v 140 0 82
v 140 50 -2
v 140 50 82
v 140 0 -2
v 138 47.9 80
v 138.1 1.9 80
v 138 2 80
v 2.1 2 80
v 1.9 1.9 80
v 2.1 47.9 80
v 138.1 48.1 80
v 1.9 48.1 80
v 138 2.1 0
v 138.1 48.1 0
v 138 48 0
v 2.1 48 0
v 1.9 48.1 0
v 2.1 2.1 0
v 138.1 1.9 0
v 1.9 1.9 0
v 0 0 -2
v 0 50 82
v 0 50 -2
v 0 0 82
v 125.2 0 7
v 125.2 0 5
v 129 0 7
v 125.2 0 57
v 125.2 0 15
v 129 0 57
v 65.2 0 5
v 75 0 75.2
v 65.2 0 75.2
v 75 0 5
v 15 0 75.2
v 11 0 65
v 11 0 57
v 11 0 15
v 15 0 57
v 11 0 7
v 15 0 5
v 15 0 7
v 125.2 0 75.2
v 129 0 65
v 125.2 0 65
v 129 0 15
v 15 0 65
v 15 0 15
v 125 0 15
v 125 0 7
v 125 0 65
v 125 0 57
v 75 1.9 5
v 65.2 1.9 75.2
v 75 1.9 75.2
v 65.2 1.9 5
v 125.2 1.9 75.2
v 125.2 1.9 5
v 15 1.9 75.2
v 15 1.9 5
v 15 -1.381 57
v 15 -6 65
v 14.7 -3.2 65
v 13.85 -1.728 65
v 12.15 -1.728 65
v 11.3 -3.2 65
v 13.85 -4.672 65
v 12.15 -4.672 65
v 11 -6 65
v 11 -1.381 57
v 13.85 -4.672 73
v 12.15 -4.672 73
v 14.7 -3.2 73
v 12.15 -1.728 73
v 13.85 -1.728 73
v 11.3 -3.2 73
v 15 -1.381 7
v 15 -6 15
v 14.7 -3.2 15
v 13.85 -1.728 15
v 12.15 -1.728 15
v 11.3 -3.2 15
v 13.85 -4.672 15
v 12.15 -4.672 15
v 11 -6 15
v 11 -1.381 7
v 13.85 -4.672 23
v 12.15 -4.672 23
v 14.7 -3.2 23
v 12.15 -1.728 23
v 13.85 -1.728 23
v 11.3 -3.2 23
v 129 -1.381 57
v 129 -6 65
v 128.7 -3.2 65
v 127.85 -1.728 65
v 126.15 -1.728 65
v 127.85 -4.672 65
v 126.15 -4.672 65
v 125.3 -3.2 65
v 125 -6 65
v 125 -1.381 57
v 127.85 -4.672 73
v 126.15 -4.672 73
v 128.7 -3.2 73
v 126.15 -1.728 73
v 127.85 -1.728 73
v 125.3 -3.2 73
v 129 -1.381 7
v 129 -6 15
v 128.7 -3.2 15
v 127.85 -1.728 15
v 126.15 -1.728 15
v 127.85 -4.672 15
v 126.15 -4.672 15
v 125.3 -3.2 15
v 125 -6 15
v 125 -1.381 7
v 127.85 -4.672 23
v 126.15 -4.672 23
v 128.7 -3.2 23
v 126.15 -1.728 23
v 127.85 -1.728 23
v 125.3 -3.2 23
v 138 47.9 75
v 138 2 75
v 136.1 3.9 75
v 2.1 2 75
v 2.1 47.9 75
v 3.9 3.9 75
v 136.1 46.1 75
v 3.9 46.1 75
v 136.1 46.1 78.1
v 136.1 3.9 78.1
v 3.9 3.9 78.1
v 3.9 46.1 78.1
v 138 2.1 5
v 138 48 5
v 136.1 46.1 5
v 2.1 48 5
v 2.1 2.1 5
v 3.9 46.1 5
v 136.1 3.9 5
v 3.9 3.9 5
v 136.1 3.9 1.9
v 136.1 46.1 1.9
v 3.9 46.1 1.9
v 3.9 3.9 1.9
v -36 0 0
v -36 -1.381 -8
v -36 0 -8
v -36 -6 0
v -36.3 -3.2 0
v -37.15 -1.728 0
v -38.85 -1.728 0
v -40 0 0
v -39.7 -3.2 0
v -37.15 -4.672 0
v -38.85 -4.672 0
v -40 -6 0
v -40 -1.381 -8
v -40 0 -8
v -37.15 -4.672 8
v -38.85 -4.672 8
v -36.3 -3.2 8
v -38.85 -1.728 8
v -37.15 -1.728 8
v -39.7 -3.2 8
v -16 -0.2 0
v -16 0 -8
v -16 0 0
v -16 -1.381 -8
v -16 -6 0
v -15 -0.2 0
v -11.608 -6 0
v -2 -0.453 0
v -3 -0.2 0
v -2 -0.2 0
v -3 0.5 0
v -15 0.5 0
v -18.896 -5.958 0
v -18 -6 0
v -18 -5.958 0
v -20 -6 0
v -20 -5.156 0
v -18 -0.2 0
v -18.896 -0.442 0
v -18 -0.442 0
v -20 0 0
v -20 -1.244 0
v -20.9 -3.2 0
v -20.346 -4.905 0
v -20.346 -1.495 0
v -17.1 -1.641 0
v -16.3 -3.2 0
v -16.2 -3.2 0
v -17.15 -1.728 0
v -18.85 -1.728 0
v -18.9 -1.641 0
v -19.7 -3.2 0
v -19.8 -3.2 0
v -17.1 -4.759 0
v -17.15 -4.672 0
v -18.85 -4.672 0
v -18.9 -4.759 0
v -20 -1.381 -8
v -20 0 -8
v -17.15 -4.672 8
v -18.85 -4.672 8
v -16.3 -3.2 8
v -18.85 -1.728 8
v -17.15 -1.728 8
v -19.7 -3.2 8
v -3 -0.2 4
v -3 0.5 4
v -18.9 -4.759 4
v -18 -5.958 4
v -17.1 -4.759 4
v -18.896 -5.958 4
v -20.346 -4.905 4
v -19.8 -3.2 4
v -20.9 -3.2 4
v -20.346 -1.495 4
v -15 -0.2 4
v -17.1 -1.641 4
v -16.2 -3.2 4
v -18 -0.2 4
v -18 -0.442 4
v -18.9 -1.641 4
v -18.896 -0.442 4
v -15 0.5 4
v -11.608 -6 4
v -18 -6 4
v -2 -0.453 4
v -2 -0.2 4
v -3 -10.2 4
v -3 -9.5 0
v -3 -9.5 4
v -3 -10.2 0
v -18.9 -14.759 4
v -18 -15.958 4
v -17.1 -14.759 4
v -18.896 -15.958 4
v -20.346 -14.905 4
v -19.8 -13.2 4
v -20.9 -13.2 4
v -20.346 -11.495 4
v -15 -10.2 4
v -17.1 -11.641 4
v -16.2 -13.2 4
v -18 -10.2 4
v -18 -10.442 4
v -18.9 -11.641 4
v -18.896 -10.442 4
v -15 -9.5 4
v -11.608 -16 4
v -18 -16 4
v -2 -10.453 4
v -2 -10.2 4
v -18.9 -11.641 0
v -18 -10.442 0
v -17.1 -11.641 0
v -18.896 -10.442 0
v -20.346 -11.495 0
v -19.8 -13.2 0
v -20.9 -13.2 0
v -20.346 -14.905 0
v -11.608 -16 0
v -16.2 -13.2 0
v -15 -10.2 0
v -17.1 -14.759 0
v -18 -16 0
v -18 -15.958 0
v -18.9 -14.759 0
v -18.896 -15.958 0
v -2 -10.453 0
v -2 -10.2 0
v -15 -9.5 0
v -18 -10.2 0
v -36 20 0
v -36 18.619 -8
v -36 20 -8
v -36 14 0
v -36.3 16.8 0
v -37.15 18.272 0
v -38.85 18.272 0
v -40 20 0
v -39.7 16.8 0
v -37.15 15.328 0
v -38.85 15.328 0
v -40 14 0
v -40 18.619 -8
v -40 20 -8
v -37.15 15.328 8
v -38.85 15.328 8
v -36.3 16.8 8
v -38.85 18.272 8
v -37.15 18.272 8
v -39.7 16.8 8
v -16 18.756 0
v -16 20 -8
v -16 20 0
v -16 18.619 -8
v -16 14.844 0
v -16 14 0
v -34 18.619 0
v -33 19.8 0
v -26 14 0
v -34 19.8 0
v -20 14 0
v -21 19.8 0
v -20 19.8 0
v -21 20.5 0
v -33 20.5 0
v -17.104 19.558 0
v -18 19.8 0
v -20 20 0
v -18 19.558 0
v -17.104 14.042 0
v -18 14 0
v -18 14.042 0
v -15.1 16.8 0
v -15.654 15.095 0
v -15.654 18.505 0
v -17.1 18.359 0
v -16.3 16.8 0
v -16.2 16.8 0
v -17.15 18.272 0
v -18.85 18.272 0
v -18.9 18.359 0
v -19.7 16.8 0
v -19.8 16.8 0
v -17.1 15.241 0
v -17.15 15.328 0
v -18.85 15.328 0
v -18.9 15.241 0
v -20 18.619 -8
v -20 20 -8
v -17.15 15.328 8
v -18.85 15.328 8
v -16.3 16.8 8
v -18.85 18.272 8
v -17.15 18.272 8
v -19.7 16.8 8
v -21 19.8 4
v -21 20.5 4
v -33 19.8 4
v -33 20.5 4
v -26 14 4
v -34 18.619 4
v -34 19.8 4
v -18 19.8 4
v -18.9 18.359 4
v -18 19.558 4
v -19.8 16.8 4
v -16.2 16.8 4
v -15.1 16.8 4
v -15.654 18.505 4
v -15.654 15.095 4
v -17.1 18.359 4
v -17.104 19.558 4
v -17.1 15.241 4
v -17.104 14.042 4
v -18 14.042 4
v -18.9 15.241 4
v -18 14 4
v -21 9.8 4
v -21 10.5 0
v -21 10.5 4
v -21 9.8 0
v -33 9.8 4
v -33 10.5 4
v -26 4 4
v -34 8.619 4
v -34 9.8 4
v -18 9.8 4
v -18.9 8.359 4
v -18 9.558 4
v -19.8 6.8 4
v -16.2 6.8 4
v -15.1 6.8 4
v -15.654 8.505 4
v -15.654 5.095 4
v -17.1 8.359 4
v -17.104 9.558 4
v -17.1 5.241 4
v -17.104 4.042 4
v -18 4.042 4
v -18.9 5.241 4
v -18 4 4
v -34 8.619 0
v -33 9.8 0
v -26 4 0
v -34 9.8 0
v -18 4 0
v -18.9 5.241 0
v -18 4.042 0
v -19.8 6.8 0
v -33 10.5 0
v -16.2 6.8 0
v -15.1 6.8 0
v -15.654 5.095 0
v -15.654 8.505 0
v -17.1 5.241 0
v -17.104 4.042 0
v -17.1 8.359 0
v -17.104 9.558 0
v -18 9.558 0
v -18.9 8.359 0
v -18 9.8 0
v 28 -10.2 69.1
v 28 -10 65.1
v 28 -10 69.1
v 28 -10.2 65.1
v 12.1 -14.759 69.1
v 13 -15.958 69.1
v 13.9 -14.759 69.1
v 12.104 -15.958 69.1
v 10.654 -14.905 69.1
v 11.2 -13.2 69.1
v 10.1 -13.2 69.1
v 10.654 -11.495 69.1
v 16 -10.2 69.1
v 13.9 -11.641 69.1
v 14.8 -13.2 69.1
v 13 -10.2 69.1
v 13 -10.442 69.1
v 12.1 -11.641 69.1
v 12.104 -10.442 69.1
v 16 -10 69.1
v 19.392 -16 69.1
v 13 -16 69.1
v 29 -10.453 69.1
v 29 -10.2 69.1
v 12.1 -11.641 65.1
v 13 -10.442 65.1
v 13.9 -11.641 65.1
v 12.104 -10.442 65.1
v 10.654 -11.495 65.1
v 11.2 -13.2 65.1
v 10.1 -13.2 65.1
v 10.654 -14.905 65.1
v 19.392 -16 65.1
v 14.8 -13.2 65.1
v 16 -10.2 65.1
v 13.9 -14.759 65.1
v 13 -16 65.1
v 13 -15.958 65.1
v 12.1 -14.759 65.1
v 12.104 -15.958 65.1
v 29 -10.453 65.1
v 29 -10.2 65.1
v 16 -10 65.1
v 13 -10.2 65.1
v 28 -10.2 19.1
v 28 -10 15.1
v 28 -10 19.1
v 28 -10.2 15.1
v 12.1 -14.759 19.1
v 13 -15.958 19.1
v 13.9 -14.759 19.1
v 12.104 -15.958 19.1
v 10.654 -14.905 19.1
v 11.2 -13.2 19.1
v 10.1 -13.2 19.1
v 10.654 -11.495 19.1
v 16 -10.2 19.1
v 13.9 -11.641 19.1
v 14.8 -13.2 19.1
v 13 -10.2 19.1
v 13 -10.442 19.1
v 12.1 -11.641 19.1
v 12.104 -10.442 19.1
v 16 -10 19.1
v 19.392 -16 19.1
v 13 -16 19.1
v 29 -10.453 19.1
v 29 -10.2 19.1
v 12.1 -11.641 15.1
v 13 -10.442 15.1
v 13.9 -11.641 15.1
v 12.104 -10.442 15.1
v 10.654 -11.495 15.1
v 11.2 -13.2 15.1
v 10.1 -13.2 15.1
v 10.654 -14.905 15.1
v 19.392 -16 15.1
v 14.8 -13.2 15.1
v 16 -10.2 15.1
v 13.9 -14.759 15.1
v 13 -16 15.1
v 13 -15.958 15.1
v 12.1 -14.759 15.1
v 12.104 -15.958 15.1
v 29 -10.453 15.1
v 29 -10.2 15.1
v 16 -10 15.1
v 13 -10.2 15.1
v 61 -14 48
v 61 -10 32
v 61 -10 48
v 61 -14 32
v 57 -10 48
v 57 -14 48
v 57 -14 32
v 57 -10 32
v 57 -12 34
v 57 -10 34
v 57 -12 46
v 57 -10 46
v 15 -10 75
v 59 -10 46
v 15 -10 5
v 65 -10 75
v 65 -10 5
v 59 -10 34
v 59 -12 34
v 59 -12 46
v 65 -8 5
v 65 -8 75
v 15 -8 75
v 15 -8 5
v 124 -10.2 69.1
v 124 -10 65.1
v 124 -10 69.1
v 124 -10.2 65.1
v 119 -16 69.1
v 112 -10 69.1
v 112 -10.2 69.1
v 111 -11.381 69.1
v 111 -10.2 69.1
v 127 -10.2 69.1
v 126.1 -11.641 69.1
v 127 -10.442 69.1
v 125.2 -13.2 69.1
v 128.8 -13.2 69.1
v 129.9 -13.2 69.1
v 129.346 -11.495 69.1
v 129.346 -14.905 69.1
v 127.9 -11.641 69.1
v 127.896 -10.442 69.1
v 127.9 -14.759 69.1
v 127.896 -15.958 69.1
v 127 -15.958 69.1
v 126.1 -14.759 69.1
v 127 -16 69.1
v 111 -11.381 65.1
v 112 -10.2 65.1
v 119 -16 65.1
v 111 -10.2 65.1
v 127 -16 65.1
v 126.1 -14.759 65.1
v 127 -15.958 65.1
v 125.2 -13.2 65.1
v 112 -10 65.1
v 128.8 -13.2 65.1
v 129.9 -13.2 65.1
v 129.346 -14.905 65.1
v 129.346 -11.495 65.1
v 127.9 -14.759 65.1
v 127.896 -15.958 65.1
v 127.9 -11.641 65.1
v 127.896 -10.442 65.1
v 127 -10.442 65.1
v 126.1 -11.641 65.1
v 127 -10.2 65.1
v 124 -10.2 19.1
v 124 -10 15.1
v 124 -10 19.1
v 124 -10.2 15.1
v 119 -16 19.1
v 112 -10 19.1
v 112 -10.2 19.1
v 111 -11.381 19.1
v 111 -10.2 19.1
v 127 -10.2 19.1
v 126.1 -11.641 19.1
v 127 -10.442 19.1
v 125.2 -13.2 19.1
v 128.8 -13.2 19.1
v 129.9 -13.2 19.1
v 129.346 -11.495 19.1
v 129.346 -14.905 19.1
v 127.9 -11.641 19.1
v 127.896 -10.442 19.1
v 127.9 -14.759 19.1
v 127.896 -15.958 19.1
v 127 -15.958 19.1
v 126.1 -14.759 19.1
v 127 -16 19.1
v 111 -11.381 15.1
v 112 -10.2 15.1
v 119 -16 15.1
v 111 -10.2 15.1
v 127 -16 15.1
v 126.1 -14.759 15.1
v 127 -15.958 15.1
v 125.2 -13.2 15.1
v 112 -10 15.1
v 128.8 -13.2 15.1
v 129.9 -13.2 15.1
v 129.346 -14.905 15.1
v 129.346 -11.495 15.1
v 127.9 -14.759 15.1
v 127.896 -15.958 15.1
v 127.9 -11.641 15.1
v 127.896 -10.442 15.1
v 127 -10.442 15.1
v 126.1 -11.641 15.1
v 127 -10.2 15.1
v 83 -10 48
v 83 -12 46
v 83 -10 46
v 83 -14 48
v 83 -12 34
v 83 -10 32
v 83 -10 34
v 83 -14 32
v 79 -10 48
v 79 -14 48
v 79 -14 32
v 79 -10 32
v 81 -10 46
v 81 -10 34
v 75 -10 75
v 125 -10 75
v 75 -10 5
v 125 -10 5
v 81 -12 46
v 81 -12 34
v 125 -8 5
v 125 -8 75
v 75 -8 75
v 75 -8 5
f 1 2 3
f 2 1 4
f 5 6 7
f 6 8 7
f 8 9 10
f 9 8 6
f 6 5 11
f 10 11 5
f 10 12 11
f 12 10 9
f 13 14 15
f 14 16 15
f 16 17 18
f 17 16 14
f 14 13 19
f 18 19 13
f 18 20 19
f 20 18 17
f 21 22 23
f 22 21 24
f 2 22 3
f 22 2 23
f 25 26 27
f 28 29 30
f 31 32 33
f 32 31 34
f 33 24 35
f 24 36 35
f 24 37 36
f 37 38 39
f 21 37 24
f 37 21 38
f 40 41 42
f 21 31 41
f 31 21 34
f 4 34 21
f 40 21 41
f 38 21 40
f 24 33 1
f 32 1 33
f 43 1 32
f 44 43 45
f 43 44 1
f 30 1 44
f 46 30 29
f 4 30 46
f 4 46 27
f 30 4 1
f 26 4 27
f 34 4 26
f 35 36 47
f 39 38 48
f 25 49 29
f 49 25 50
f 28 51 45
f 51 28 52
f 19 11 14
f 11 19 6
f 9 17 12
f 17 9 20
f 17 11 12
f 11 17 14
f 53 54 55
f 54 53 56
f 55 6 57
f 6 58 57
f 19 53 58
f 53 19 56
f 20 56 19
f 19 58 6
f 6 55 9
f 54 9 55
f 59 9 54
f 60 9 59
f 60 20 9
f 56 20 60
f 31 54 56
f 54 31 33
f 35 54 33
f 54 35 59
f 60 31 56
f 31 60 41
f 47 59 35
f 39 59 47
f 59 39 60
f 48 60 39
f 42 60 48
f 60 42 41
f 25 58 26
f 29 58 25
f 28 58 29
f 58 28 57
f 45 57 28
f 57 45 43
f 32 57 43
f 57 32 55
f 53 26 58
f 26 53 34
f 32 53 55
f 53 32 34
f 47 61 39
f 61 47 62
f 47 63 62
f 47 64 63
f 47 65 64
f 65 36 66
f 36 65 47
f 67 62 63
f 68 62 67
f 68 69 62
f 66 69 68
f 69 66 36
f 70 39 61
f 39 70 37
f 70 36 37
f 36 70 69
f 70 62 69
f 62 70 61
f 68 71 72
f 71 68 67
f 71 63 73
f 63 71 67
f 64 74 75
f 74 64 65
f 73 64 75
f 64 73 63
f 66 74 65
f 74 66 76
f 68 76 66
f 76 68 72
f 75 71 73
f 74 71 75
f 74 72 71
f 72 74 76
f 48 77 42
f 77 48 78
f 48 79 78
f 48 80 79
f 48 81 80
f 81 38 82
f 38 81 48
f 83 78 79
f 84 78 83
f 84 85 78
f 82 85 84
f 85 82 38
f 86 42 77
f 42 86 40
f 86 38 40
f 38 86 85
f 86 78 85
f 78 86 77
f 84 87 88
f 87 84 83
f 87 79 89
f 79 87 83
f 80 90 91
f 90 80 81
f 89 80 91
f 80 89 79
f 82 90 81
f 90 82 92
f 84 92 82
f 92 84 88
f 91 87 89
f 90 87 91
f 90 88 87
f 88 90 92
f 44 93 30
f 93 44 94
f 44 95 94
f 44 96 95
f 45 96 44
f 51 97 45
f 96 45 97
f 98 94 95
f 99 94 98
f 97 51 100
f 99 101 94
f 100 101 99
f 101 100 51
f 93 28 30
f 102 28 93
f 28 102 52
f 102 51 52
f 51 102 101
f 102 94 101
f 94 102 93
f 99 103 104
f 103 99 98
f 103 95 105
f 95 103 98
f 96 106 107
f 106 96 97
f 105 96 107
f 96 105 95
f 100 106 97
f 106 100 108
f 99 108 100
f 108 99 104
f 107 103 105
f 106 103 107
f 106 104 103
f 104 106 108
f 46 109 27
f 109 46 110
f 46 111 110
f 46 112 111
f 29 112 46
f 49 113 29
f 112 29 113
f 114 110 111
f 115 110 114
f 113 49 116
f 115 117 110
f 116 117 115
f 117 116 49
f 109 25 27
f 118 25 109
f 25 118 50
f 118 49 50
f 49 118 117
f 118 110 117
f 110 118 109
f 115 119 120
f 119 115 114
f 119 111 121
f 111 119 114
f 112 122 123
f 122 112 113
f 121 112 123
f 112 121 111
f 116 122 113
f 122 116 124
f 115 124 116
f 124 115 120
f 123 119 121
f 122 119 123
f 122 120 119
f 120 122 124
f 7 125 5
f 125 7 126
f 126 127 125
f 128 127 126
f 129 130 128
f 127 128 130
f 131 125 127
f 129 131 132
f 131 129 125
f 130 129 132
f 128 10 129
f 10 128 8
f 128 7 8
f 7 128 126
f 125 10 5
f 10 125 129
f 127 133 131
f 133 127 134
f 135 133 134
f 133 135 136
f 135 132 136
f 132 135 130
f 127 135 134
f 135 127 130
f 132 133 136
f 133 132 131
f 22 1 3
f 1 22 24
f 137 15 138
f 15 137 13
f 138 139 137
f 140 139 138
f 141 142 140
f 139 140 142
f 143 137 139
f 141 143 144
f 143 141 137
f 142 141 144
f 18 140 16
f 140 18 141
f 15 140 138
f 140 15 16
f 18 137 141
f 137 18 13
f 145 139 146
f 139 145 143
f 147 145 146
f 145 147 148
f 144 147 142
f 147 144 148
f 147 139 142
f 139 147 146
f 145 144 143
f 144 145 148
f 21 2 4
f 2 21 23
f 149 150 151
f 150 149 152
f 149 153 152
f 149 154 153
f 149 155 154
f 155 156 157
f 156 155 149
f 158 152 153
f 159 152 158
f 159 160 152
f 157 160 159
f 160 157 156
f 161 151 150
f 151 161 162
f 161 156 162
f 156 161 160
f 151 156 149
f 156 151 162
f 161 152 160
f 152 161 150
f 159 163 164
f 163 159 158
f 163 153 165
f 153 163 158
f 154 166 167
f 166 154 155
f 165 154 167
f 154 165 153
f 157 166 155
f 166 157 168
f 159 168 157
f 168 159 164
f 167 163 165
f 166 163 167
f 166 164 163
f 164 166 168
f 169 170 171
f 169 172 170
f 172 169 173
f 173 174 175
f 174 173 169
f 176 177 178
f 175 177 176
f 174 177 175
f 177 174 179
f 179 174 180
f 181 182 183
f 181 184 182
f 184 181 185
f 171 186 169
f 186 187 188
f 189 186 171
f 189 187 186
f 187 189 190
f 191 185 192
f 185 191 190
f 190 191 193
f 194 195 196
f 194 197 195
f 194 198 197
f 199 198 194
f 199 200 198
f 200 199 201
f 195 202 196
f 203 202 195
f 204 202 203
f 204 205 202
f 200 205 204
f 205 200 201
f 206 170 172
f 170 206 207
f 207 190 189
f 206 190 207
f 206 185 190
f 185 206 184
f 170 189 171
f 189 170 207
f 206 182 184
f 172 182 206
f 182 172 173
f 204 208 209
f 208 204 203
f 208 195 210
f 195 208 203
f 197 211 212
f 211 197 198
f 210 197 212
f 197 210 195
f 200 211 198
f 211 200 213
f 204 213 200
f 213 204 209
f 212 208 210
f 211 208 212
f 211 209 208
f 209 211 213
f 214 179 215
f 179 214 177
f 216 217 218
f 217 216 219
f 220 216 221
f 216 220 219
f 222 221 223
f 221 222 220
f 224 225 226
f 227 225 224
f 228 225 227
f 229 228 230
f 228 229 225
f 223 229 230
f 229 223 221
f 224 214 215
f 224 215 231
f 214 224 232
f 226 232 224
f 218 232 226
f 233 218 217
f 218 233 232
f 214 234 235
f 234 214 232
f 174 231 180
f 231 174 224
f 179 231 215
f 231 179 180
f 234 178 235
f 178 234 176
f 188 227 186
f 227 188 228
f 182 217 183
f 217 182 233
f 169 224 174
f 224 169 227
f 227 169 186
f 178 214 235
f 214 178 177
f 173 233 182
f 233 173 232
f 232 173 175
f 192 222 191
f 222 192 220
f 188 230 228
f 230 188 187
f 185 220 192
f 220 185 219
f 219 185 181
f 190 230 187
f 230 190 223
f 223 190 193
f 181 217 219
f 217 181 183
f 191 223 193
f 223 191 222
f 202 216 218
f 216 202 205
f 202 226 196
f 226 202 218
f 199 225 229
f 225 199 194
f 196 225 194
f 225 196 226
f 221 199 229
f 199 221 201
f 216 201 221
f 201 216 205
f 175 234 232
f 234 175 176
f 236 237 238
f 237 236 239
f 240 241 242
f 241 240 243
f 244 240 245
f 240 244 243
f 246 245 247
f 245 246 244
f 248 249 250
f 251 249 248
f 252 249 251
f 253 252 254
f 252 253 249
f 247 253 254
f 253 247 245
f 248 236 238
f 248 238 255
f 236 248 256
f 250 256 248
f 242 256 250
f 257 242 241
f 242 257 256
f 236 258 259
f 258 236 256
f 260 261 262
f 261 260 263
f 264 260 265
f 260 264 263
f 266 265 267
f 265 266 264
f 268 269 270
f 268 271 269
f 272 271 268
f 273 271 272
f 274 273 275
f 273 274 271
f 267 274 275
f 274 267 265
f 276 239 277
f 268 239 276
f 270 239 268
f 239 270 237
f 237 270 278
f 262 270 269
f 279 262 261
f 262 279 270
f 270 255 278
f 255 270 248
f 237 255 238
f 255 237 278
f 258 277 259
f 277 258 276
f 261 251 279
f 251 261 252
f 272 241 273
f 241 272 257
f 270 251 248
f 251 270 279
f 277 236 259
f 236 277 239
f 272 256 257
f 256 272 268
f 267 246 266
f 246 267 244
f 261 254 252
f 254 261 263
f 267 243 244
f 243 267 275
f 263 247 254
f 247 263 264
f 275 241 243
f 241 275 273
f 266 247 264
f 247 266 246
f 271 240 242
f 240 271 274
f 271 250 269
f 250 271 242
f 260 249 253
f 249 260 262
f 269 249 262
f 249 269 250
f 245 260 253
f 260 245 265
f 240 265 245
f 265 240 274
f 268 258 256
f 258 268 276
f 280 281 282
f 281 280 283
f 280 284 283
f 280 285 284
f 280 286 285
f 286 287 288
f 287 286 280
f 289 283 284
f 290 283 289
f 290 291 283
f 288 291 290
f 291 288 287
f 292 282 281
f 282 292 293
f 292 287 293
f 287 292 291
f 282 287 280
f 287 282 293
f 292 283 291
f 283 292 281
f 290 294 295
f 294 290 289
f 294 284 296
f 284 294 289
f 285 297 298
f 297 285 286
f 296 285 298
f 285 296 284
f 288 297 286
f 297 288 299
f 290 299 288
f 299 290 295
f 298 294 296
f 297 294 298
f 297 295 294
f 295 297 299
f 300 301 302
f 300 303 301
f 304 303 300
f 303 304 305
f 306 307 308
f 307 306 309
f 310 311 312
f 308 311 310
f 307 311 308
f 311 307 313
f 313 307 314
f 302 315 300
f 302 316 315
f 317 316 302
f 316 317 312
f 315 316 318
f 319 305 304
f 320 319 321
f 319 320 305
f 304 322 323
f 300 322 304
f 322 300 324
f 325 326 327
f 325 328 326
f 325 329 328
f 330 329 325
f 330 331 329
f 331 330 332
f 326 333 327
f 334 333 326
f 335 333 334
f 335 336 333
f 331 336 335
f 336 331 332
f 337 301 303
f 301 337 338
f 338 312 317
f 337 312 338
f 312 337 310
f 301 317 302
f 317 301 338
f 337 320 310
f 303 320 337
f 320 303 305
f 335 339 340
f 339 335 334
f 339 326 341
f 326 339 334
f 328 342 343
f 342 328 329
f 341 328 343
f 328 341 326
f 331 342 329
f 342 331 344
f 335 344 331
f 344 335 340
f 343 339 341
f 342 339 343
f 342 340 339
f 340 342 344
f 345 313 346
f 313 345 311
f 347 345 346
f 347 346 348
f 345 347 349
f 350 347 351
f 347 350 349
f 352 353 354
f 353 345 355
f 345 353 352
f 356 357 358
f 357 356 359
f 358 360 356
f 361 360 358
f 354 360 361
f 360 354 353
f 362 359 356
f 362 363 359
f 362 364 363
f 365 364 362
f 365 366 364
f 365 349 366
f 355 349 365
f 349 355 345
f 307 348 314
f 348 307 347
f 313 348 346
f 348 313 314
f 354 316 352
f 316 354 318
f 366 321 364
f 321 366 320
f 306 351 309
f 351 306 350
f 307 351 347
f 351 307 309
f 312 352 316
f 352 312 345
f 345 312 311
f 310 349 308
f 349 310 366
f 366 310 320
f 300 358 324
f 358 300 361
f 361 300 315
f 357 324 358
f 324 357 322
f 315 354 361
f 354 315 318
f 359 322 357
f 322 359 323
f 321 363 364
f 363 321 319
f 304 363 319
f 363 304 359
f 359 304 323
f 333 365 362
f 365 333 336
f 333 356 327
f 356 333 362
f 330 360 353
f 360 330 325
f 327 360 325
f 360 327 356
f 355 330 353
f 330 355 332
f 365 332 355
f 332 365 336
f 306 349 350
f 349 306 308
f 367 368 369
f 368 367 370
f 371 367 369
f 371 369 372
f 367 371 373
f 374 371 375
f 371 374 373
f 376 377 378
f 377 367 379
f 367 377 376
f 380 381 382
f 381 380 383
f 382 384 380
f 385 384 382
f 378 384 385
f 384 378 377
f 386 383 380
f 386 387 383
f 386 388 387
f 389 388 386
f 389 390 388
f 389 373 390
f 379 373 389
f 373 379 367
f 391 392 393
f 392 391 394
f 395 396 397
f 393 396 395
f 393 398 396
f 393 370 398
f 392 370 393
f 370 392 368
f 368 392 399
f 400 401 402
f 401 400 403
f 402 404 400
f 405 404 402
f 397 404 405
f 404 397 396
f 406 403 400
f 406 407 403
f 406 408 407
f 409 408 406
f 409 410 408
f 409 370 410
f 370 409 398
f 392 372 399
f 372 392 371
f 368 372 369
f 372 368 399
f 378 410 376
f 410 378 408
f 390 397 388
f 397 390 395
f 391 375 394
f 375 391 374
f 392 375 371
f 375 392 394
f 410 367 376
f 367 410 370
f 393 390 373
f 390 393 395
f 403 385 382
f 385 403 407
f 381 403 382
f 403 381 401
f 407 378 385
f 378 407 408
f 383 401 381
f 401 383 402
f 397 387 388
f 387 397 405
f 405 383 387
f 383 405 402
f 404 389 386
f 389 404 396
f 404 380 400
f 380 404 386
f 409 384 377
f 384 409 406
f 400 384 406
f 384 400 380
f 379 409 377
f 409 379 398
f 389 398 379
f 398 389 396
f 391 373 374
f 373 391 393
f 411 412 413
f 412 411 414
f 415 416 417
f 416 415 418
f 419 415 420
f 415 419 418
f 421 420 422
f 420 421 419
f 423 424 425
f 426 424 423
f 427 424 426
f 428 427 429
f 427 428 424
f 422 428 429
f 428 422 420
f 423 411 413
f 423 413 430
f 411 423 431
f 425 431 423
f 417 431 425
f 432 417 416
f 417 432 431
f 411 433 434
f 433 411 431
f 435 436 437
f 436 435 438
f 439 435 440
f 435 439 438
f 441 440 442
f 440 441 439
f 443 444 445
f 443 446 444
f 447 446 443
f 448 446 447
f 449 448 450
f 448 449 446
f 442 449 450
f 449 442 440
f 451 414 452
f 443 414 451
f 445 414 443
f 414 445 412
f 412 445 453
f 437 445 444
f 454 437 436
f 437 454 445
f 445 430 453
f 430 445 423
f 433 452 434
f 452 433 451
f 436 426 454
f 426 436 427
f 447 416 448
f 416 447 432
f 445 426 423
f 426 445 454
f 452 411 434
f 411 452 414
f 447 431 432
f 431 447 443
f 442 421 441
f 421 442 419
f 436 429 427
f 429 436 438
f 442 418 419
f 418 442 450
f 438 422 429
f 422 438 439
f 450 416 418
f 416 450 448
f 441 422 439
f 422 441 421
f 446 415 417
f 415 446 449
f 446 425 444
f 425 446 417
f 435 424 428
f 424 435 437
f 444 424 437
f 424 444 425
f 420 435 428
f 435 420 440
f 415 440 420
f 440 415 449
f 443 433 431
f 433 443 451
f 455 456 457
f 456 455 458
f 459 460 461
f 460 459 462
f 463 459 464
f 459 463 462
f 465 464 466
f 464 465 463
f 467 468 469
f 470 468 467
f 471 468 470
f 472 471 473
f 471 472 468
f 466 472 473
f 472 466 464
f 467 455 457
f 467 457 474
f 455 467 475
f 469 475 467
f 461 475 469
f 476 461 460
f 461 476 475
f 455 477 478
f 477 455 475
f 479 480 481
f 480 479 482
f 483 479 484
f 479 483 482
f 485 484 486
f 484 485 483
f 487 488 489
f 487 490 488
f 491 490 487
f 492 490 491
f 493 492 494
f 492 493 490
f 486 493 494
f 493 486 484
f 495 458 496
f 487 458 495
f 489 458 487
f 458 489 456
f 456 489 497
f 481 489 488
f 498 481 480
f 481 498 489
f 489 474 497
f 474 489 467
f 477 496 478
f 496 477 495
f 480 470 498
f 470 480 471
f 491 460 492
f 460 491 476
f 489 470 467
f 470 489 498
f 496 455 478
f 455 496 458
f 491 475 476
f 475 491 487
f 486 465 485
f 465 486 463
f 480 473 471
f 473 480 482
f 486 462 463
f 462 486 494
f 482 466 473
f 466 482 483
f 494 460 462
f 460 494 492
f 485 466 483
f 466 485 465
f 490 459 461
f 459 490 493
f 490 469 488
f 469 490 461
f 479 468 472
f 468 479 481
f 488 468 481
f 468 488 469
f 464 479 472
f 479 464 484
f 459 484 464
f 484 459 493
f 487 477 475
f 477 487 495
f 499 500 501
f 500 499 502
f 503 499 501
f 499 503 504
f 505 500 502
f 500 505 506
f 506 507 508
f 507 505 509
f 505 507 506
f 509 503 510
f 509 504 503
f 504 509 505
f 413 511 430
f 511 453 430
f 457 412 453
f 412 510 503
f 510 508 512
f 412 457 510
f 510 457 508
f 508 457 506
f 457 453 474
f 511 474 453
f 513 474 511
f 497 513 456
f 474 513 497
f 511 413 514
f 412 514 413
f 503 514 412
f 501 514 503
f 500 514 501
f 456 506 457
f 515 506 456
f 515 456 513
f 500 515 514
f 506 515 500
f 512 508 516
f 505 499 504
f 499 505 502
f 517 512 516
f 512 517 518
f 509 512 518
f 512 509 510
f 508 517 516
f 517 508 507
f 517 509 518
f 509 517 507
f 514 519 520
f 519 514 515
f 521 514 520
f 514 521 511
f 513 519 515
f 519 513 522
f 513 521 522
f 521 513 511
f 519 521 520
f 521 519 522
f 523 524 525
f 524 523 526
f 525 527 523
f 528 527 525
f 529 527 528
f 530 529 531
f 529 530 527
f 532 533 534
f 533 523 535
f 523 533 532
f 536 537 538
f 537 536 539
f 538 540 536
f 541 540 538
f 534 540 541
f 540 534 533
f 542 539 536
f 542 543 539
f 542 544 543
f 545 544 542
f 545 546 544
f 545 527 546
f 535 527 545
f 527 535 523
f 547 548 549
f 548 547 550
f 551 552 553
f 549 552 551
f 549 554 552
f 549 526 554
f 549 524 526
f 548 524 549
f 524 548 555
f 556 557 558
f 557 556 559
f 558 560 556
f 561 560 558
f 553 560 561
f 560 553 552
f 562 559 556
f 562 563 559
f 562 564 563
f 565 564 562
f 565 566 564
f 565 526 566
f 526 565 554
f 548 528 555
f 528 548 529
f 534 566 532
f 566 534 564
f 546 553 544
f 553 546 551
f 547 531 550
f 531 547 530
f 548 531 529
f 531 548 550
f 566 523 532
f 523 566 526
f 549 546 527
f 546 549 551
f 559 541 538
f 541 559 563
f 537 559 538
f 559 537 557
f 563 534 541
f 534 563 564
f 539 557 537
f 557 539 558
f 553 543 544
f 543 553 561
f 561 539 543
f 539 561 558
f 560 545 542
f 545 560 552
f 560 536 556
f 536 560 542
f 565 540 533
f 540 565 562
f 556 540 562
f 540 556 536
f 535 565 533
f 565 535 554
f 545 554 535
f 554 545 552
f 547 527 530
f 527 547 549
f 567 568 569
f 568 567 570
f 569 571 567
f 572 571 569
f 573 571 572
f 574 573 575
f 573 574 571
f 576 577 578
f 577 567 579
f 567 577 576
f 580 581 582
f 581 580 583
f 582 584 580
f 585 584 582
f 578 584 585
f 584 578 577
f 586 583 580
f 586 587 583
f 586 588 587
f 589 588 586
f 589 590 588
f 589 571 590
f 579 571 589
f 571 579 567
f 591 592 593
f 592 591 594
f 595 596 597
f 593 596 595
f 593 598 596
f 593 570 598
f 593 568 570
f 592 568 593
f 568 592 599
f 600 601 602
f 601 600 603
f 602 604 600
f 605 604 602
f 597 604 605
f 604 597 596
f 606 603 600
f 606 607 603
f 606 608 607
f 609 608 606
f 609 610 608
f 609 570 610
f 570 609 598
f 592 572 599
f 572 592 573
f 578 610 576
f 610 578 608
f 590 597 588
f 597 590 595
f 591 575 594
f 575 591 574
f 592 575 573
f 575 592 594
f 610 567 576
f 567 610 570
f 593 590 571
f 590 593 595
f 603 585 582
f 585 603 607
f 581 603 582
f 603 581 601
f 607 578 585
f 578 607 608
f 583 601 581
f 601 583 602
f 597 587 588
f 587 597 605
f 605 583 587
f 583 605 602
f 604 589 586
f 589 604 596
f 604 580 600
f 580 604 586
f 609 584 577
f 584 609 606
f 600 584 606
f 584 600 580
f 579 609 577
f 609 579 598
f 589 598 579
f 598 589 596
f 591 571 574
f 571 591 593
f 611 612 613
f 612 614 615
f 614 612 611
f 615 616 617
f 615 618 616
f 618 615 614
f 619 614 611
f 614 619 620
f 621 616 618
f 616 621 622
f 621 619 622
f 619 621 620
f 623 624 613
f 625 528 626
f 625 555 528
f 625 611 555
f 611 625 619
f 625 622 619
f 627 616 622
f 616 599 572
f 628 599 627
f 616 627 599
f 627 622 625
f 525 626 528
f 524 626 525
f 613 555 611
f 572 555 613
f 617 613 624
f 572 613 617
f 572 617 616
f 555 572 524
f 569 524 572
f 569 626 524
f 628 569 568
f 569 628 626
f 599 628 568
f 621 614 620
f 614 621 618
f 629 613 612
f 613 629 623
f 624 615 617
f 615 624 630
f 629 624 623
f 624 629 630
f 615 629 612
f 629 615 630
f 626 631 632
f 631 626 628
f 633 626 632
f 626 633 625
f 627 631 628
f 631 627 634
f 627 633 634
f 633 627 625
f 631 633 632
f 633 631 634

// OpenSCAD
// Telco Cabinet - common 2G example
// 20260109, Ondrej DURAS (dury) NOKIA 
/* [Preview] */
preview="basic"; // [basic,detail,movie,plate]
doorPull=-10;    // [-20:0]
roofPull=0;      // [0:30]

/* [Dimensions] */

padding=10;    // rozostup medzi vecami na vyrovnej doske
spacingO=0.1;  // vonkajsi odstup dotykajucich sa casti - IN  - skrutku "I" do matice "O"
spacingI=0.1;  // vnutorny odstup dotykajucich sa casti - OUT - palicu "I" pichame do diery "O"
sysTick=2.0;   // hrubka steny - zakladny rozmer
clueDimm=4.0;  // hrana  prepojovacieho stvorca
clueTick=1.0;  // hrubka prepojovacieho stvorca
spo=spacingO;
spi=spacingI;
pad=padding;

lineWidth=40;  // sirka karty
lineDepth=40;  // hlbka karty
lineHight=4;   // vyska karty
lineTick=1.0;  // hrubka dosky
fanWidth=20;   // sirka ventilatora
fanDepth=15;   // hlbka ventilatora ... iz droja, pozor ! rucky sa nerataju
fanHight=20;   // vyska ventilatora
psuWidth=13;   // sirka zdroja (3 zdroje pre chassis)
psuHight=15;   // vyska zdroja a Filtrov
psuDepth=40;   // hlbka zdroja
filtWidth=40;  // firka filtra 
filtHight=15;  // vyska filtra = musi byt rovnaka ako vyska zdroja
filtDepth=15;   // hlbka filtra

cabWidth=140;  // sirka kabinetu tecoTower-a
cabHight=80;   // vyska kabinetu
cabDepth=50;   // hlbka kabinetu
cabTick=2.0;
doorWidth=50;
doorHight=70;
door1at=15;      // umiestnenie 1.dveri od odkraja skrinky, 2.dvere nizsie 
pantStick=3.5;    // hrubka pantoveho valca
pantDepth=6;      //hrubka podlozky pantu
lockHight=16;     // vyska zamku na dverach
lockDepth=4;      // hrubka zamku na dverach
lockWidth=4;      // sirka zamku na dverach
lockExcav=2;      // Excavation - Vyhlbenie do hranola (normalny rozmer - vyhlbenie)

// musi platit : psuDepth+filtDepth = lineDepth + fanDepth
// dohromady spolu by mal byt vlastne iba jeden spacing
// spacing0 + spacingi = spacing
// spacing:
// 0.0 - masaker, veci ktore do seba nezastrcis
// 0.1 - naozaj na pevno, aj zlomis ...a uz nevytiahnes.
// 0.2 - ide tazko, casom sa trosku rozbeha
// 0.3 - neviem
// 0.4 - urcite bude vypadavat

/* [Colors] */

colorW = "#e0e0e0"; // ostro biela
colorL = "#c0c0c0"; // velmi svetla
colorS = "#808080"; // siva - zakladna
colorD = "#404040"; // tmava - Dark
colorK = "#202020"; // uplne cierna
colorR = "#802020"; // cervena
colorG = "#208000"; // zelena
colorB = "#202080"; // modra

colorCabinet = "#808080";  // farba bocnych stien skrinky
colorDoor = "#808020";     // farba dveri
colorPant = "#101090";     // farba pantov na dverach
colorLock = "#105590";     // farba zamku na dverach
colorRoof = "#104080";     // farba vrchu a spodku kabinetu

/* [Calculations] */

door2at=cabWidth-door1at-doorWidth; // umiestnenie 2.dveri od odkraja skrinky
doorBase=(cabHight-doorHight)/2;
doorTick=cabTick;   // hrubka dveri = hrubke stien skrine
/* [Modules] */


module cabPant() {
    union() {
        translate([2,-pantDepth/2-spi-spo,0])
            cylinder(h=8,d=pantStick-spi);
        difference() {
            translate([0,-pantDepth,-8])
                cube([4,pantDepth,8]);
            translate([-1,-pantDepth,0])
                rotate([210,0,0])
                cube([6,pantDepth,10]);
        }
    } 
}

module leftPant() {
   difference() { 
        union() {
            translate([5,-1,0])   // spojka medzi pantom a dverami
                cube([12,1.5,4]);
            translate([2,-pantDepth,0])  // hranol
                cube([16,pantDepth-spi-spo,4]);
            translate([2,-pantDepth/2-spi-spo,0])  // a cylinder vonkajsej casti
                cylinder(h=4,d=pantDepth-spi-spo);
        }
        translate([2,-pantDepth/2-spi-spo,-1]) // diera
            cylinder(h=6,d=pantStick+spo);
        translate([10,-2*pantDepth,-1])    // zrezanie hranolu
            rotate([0,0,30])
            cube([16,pantDepth,6]);
    }
}

module rightPant() {
   difference() { 
        union() {
            translate([-13,-1,0])   // spojka medzi pantom a dverami
                cube([12,1.5,4]);
            translate([-14,-pantDepth,0])  // hranol
                cube([16,pantDepth-spi-spo,4]);
            translate([2,-pantDepth/2-spi-spo,0])  // a cylinder vonkajsej casti
                cylinder(h=4,d=pantDepth-spi-spo);
        }
        translate([2,-pantDepth/2-spi-spo,-1]) // diera
            cylinder(h=6,d=pantStick+spo);
        translate([-6,-1*pantDepth,-1])    // zrezanie hranolu
            rotate([0,0,150])
            cube([16,pantDepth,6]);
    }

}

module leftLock() {  // referencny bod je uprostred hlavneho kvadru  vlavo vzadu
    difference() {
        translate([0,-lockDepth,-lockHight/2])
            cube([lockWidth,lockDepth,lockHight]);
        translate([-1,-lockDepth+lockExcav,-lockHight/2+lockExcav])
            cube([lockWidth-lockExcav+1,lockDepth-lockExcav,lockHight-2*lockExcav]);
    }
}
module rightLock() {
    difference() {
        translate([0,-lockDepth,-lockHight/2])
            cube([lockWidth,lockDepth,lockHight]);
        translate([lockExcav,-lockDepth+lockExcav,-lockHight/2+lockExcav])
            cube([lockWidth-lockExcav+1,lockDepth-lockExcav,lockHight-2*lockExcav]);
    }
}

module cabinetBody() {
    union() {
    difference() {
        cube([cabWidth,cabDepth,cabHight]);
        translate([cabTick-spo,cabTick-spo,-1])
            cube([cabWidth-2*cabTick+2*spo,cabDepth-2*cabTick+2*spo,cabHight+2]);
        translate([door1at,-1,doorBase])
            cube([doorWidth+2*spo,cabTick+2,doorHight+2*spo]);
        translate([door2at,-1,doorBase])
            cube([doorWidth+2*spo,cabTick+2,doorHight+2*spo]);
    }
        translate([door1at-4,0,doorBase+doorHight*6/7])
            cabPant();
        translate([door1at-4,0,doorBase+doorHight*1/7])
            cabPant();
        translate([cabWidth-15,0,doorBase+doorHight*6/7])
            cabPant();
        translate([cabWidth-15,0,doorBase+doorHight*1/7])
            cabPant();
    }
}

module cabinetRoof() {  // v polohe na vyrobnej doske
    union() {
        translate([0,0,0])
            cube([cabWidth,cabDepth,cabTick]);
        difference() {
            translate([cabTick+spi,cabTick+spi,cabTick])
                cube([cabWidth-2*cabTick-spi,cabDepth-2*cabTick-spi,doorBase]);
            translate([cabTick*2-spo,cabTick*2-spo,cabTick*2-spo])
                cube([cabWidth-4*cabTick+2*spo,cabDepth-4*cabTick+2*spo,doorBase+1]);
        }
    }
}

module cabinetRoofTop() {
    translate([0,cabDepth,cabTick])
        rotate([180,0,0])
        cabinetRoof();
}

module modCabinet() {
    color(colorCabinet)
    cabinetBody();

    color(colorRoof)
    translate([0,0,cabHight+roofPull])
    cabinetRoofTop();

    color(colorRoof)
    translate([0,0,-cabTick-roofPull])
    cabinetRoof();
    
}

module doorLeft() {
    color(colorDoor)
    union() {
        translate([0,0,0])   // doska dveri
            cube([doorWidth,doorTick,doorHight]);    
        translate([-4,0,doorHight*6/7+spi])  // horny pant
            leftPant();
        translate([-4,0,doorHight*1/7+spi])  // dolny pant
            leftPant();
        translate([doorWidth-lockWidth*2,0,doorHight/2])
            leftLock();
    }
}
module doorRight() {
    color(colorDoor)
    union() {
        translate([0,0,0])  // doska dveri
            cube([doorWidth,doorTick,doorHight]);    
        translate([doorWidth,0,doorHight*6/7+spi])  // horny pant
            rightPant();
        translate([doorWidth,0,doorHight*1/7+spi])  // dolny pant
            rightPant();
        translate([lockWidth,0,doorHight/2])
            rightLock();
    }
}

/* [Previews] */
if(preview=="basic") {
    translate([0,0,0])
        modCabinet();

    translate([-40,0,0])
        cabPant();
    translate([-20,0,0])
        cabPant();
    translate([-20,0,0])
        leftPant();
    translate([-20,-10,0])
        leftPant();

    translate([-40,20,0])
        cabPant();
    translate([-20,20,0])
        cabPant();
    translate([-20,20,0])
        rightPant();
    translate([-20,10,0])
        rightPant();

    translate([door1at,doorPull,doorBase])
        doorLeft();
    translate([door2at,doorPull,doorBase])
        doorRight();
}

if(preview=="plate") {
    translate([0,0,0])
        cabinetRoof();
    translate([0,cabDepth+pad,0])
        cabinetRoof();
    translate([0,cabDepth*2+pad*2,0])
        cabinetBody();
    translate([cabWidth+pad,0,cabTick])
        rotate([-90,0,0])
        doorLeft();
    translate([cabWidth+pad,doorHight+pad,cabTick])
        rotate([-90,0,0])
        doorRight();


}

/* [NOTEs] */
// 1. v gramatike SCAD nastavit hviezdickovy fold ako uroven-2, ostatne if/module ako uroven-1
// 2. v Towers ... opravit spacing, zmenit spacing na holderoch na spacing-I (0.0mm)  a vsade inde na spacing-O (0.2mm) 
// 3. urobit experiment, ci spacingI/O zafunguje a pripadne podla toho opravit spacing 014-mSR7-i2
// 4. vyskusat zavit
// 5. zaviest zavit do vnutra kolieska
// 6. 014-mSR7-i3 na baze 4mm = lineCardHeight, skusit, ci by sa take nieco dalo
// 7. 014-mSR7-i4 zalozeny na dimenziach vyskaKarty=4mm sirkaKarty=40mm sirkaRacku=50mm hlbkaKarty=??pozri hlbkaZdroja=15mm
// 8. telcoTower s trojuholnikovym zakladom
// 9. RRFU - to su tie vonkajsie jednotky - koncove stupne radia
//10. Vyskusat 1.0mm kabel (medeny drot) 0.6mm kabel (ocelovy drot)

// --- end ---
